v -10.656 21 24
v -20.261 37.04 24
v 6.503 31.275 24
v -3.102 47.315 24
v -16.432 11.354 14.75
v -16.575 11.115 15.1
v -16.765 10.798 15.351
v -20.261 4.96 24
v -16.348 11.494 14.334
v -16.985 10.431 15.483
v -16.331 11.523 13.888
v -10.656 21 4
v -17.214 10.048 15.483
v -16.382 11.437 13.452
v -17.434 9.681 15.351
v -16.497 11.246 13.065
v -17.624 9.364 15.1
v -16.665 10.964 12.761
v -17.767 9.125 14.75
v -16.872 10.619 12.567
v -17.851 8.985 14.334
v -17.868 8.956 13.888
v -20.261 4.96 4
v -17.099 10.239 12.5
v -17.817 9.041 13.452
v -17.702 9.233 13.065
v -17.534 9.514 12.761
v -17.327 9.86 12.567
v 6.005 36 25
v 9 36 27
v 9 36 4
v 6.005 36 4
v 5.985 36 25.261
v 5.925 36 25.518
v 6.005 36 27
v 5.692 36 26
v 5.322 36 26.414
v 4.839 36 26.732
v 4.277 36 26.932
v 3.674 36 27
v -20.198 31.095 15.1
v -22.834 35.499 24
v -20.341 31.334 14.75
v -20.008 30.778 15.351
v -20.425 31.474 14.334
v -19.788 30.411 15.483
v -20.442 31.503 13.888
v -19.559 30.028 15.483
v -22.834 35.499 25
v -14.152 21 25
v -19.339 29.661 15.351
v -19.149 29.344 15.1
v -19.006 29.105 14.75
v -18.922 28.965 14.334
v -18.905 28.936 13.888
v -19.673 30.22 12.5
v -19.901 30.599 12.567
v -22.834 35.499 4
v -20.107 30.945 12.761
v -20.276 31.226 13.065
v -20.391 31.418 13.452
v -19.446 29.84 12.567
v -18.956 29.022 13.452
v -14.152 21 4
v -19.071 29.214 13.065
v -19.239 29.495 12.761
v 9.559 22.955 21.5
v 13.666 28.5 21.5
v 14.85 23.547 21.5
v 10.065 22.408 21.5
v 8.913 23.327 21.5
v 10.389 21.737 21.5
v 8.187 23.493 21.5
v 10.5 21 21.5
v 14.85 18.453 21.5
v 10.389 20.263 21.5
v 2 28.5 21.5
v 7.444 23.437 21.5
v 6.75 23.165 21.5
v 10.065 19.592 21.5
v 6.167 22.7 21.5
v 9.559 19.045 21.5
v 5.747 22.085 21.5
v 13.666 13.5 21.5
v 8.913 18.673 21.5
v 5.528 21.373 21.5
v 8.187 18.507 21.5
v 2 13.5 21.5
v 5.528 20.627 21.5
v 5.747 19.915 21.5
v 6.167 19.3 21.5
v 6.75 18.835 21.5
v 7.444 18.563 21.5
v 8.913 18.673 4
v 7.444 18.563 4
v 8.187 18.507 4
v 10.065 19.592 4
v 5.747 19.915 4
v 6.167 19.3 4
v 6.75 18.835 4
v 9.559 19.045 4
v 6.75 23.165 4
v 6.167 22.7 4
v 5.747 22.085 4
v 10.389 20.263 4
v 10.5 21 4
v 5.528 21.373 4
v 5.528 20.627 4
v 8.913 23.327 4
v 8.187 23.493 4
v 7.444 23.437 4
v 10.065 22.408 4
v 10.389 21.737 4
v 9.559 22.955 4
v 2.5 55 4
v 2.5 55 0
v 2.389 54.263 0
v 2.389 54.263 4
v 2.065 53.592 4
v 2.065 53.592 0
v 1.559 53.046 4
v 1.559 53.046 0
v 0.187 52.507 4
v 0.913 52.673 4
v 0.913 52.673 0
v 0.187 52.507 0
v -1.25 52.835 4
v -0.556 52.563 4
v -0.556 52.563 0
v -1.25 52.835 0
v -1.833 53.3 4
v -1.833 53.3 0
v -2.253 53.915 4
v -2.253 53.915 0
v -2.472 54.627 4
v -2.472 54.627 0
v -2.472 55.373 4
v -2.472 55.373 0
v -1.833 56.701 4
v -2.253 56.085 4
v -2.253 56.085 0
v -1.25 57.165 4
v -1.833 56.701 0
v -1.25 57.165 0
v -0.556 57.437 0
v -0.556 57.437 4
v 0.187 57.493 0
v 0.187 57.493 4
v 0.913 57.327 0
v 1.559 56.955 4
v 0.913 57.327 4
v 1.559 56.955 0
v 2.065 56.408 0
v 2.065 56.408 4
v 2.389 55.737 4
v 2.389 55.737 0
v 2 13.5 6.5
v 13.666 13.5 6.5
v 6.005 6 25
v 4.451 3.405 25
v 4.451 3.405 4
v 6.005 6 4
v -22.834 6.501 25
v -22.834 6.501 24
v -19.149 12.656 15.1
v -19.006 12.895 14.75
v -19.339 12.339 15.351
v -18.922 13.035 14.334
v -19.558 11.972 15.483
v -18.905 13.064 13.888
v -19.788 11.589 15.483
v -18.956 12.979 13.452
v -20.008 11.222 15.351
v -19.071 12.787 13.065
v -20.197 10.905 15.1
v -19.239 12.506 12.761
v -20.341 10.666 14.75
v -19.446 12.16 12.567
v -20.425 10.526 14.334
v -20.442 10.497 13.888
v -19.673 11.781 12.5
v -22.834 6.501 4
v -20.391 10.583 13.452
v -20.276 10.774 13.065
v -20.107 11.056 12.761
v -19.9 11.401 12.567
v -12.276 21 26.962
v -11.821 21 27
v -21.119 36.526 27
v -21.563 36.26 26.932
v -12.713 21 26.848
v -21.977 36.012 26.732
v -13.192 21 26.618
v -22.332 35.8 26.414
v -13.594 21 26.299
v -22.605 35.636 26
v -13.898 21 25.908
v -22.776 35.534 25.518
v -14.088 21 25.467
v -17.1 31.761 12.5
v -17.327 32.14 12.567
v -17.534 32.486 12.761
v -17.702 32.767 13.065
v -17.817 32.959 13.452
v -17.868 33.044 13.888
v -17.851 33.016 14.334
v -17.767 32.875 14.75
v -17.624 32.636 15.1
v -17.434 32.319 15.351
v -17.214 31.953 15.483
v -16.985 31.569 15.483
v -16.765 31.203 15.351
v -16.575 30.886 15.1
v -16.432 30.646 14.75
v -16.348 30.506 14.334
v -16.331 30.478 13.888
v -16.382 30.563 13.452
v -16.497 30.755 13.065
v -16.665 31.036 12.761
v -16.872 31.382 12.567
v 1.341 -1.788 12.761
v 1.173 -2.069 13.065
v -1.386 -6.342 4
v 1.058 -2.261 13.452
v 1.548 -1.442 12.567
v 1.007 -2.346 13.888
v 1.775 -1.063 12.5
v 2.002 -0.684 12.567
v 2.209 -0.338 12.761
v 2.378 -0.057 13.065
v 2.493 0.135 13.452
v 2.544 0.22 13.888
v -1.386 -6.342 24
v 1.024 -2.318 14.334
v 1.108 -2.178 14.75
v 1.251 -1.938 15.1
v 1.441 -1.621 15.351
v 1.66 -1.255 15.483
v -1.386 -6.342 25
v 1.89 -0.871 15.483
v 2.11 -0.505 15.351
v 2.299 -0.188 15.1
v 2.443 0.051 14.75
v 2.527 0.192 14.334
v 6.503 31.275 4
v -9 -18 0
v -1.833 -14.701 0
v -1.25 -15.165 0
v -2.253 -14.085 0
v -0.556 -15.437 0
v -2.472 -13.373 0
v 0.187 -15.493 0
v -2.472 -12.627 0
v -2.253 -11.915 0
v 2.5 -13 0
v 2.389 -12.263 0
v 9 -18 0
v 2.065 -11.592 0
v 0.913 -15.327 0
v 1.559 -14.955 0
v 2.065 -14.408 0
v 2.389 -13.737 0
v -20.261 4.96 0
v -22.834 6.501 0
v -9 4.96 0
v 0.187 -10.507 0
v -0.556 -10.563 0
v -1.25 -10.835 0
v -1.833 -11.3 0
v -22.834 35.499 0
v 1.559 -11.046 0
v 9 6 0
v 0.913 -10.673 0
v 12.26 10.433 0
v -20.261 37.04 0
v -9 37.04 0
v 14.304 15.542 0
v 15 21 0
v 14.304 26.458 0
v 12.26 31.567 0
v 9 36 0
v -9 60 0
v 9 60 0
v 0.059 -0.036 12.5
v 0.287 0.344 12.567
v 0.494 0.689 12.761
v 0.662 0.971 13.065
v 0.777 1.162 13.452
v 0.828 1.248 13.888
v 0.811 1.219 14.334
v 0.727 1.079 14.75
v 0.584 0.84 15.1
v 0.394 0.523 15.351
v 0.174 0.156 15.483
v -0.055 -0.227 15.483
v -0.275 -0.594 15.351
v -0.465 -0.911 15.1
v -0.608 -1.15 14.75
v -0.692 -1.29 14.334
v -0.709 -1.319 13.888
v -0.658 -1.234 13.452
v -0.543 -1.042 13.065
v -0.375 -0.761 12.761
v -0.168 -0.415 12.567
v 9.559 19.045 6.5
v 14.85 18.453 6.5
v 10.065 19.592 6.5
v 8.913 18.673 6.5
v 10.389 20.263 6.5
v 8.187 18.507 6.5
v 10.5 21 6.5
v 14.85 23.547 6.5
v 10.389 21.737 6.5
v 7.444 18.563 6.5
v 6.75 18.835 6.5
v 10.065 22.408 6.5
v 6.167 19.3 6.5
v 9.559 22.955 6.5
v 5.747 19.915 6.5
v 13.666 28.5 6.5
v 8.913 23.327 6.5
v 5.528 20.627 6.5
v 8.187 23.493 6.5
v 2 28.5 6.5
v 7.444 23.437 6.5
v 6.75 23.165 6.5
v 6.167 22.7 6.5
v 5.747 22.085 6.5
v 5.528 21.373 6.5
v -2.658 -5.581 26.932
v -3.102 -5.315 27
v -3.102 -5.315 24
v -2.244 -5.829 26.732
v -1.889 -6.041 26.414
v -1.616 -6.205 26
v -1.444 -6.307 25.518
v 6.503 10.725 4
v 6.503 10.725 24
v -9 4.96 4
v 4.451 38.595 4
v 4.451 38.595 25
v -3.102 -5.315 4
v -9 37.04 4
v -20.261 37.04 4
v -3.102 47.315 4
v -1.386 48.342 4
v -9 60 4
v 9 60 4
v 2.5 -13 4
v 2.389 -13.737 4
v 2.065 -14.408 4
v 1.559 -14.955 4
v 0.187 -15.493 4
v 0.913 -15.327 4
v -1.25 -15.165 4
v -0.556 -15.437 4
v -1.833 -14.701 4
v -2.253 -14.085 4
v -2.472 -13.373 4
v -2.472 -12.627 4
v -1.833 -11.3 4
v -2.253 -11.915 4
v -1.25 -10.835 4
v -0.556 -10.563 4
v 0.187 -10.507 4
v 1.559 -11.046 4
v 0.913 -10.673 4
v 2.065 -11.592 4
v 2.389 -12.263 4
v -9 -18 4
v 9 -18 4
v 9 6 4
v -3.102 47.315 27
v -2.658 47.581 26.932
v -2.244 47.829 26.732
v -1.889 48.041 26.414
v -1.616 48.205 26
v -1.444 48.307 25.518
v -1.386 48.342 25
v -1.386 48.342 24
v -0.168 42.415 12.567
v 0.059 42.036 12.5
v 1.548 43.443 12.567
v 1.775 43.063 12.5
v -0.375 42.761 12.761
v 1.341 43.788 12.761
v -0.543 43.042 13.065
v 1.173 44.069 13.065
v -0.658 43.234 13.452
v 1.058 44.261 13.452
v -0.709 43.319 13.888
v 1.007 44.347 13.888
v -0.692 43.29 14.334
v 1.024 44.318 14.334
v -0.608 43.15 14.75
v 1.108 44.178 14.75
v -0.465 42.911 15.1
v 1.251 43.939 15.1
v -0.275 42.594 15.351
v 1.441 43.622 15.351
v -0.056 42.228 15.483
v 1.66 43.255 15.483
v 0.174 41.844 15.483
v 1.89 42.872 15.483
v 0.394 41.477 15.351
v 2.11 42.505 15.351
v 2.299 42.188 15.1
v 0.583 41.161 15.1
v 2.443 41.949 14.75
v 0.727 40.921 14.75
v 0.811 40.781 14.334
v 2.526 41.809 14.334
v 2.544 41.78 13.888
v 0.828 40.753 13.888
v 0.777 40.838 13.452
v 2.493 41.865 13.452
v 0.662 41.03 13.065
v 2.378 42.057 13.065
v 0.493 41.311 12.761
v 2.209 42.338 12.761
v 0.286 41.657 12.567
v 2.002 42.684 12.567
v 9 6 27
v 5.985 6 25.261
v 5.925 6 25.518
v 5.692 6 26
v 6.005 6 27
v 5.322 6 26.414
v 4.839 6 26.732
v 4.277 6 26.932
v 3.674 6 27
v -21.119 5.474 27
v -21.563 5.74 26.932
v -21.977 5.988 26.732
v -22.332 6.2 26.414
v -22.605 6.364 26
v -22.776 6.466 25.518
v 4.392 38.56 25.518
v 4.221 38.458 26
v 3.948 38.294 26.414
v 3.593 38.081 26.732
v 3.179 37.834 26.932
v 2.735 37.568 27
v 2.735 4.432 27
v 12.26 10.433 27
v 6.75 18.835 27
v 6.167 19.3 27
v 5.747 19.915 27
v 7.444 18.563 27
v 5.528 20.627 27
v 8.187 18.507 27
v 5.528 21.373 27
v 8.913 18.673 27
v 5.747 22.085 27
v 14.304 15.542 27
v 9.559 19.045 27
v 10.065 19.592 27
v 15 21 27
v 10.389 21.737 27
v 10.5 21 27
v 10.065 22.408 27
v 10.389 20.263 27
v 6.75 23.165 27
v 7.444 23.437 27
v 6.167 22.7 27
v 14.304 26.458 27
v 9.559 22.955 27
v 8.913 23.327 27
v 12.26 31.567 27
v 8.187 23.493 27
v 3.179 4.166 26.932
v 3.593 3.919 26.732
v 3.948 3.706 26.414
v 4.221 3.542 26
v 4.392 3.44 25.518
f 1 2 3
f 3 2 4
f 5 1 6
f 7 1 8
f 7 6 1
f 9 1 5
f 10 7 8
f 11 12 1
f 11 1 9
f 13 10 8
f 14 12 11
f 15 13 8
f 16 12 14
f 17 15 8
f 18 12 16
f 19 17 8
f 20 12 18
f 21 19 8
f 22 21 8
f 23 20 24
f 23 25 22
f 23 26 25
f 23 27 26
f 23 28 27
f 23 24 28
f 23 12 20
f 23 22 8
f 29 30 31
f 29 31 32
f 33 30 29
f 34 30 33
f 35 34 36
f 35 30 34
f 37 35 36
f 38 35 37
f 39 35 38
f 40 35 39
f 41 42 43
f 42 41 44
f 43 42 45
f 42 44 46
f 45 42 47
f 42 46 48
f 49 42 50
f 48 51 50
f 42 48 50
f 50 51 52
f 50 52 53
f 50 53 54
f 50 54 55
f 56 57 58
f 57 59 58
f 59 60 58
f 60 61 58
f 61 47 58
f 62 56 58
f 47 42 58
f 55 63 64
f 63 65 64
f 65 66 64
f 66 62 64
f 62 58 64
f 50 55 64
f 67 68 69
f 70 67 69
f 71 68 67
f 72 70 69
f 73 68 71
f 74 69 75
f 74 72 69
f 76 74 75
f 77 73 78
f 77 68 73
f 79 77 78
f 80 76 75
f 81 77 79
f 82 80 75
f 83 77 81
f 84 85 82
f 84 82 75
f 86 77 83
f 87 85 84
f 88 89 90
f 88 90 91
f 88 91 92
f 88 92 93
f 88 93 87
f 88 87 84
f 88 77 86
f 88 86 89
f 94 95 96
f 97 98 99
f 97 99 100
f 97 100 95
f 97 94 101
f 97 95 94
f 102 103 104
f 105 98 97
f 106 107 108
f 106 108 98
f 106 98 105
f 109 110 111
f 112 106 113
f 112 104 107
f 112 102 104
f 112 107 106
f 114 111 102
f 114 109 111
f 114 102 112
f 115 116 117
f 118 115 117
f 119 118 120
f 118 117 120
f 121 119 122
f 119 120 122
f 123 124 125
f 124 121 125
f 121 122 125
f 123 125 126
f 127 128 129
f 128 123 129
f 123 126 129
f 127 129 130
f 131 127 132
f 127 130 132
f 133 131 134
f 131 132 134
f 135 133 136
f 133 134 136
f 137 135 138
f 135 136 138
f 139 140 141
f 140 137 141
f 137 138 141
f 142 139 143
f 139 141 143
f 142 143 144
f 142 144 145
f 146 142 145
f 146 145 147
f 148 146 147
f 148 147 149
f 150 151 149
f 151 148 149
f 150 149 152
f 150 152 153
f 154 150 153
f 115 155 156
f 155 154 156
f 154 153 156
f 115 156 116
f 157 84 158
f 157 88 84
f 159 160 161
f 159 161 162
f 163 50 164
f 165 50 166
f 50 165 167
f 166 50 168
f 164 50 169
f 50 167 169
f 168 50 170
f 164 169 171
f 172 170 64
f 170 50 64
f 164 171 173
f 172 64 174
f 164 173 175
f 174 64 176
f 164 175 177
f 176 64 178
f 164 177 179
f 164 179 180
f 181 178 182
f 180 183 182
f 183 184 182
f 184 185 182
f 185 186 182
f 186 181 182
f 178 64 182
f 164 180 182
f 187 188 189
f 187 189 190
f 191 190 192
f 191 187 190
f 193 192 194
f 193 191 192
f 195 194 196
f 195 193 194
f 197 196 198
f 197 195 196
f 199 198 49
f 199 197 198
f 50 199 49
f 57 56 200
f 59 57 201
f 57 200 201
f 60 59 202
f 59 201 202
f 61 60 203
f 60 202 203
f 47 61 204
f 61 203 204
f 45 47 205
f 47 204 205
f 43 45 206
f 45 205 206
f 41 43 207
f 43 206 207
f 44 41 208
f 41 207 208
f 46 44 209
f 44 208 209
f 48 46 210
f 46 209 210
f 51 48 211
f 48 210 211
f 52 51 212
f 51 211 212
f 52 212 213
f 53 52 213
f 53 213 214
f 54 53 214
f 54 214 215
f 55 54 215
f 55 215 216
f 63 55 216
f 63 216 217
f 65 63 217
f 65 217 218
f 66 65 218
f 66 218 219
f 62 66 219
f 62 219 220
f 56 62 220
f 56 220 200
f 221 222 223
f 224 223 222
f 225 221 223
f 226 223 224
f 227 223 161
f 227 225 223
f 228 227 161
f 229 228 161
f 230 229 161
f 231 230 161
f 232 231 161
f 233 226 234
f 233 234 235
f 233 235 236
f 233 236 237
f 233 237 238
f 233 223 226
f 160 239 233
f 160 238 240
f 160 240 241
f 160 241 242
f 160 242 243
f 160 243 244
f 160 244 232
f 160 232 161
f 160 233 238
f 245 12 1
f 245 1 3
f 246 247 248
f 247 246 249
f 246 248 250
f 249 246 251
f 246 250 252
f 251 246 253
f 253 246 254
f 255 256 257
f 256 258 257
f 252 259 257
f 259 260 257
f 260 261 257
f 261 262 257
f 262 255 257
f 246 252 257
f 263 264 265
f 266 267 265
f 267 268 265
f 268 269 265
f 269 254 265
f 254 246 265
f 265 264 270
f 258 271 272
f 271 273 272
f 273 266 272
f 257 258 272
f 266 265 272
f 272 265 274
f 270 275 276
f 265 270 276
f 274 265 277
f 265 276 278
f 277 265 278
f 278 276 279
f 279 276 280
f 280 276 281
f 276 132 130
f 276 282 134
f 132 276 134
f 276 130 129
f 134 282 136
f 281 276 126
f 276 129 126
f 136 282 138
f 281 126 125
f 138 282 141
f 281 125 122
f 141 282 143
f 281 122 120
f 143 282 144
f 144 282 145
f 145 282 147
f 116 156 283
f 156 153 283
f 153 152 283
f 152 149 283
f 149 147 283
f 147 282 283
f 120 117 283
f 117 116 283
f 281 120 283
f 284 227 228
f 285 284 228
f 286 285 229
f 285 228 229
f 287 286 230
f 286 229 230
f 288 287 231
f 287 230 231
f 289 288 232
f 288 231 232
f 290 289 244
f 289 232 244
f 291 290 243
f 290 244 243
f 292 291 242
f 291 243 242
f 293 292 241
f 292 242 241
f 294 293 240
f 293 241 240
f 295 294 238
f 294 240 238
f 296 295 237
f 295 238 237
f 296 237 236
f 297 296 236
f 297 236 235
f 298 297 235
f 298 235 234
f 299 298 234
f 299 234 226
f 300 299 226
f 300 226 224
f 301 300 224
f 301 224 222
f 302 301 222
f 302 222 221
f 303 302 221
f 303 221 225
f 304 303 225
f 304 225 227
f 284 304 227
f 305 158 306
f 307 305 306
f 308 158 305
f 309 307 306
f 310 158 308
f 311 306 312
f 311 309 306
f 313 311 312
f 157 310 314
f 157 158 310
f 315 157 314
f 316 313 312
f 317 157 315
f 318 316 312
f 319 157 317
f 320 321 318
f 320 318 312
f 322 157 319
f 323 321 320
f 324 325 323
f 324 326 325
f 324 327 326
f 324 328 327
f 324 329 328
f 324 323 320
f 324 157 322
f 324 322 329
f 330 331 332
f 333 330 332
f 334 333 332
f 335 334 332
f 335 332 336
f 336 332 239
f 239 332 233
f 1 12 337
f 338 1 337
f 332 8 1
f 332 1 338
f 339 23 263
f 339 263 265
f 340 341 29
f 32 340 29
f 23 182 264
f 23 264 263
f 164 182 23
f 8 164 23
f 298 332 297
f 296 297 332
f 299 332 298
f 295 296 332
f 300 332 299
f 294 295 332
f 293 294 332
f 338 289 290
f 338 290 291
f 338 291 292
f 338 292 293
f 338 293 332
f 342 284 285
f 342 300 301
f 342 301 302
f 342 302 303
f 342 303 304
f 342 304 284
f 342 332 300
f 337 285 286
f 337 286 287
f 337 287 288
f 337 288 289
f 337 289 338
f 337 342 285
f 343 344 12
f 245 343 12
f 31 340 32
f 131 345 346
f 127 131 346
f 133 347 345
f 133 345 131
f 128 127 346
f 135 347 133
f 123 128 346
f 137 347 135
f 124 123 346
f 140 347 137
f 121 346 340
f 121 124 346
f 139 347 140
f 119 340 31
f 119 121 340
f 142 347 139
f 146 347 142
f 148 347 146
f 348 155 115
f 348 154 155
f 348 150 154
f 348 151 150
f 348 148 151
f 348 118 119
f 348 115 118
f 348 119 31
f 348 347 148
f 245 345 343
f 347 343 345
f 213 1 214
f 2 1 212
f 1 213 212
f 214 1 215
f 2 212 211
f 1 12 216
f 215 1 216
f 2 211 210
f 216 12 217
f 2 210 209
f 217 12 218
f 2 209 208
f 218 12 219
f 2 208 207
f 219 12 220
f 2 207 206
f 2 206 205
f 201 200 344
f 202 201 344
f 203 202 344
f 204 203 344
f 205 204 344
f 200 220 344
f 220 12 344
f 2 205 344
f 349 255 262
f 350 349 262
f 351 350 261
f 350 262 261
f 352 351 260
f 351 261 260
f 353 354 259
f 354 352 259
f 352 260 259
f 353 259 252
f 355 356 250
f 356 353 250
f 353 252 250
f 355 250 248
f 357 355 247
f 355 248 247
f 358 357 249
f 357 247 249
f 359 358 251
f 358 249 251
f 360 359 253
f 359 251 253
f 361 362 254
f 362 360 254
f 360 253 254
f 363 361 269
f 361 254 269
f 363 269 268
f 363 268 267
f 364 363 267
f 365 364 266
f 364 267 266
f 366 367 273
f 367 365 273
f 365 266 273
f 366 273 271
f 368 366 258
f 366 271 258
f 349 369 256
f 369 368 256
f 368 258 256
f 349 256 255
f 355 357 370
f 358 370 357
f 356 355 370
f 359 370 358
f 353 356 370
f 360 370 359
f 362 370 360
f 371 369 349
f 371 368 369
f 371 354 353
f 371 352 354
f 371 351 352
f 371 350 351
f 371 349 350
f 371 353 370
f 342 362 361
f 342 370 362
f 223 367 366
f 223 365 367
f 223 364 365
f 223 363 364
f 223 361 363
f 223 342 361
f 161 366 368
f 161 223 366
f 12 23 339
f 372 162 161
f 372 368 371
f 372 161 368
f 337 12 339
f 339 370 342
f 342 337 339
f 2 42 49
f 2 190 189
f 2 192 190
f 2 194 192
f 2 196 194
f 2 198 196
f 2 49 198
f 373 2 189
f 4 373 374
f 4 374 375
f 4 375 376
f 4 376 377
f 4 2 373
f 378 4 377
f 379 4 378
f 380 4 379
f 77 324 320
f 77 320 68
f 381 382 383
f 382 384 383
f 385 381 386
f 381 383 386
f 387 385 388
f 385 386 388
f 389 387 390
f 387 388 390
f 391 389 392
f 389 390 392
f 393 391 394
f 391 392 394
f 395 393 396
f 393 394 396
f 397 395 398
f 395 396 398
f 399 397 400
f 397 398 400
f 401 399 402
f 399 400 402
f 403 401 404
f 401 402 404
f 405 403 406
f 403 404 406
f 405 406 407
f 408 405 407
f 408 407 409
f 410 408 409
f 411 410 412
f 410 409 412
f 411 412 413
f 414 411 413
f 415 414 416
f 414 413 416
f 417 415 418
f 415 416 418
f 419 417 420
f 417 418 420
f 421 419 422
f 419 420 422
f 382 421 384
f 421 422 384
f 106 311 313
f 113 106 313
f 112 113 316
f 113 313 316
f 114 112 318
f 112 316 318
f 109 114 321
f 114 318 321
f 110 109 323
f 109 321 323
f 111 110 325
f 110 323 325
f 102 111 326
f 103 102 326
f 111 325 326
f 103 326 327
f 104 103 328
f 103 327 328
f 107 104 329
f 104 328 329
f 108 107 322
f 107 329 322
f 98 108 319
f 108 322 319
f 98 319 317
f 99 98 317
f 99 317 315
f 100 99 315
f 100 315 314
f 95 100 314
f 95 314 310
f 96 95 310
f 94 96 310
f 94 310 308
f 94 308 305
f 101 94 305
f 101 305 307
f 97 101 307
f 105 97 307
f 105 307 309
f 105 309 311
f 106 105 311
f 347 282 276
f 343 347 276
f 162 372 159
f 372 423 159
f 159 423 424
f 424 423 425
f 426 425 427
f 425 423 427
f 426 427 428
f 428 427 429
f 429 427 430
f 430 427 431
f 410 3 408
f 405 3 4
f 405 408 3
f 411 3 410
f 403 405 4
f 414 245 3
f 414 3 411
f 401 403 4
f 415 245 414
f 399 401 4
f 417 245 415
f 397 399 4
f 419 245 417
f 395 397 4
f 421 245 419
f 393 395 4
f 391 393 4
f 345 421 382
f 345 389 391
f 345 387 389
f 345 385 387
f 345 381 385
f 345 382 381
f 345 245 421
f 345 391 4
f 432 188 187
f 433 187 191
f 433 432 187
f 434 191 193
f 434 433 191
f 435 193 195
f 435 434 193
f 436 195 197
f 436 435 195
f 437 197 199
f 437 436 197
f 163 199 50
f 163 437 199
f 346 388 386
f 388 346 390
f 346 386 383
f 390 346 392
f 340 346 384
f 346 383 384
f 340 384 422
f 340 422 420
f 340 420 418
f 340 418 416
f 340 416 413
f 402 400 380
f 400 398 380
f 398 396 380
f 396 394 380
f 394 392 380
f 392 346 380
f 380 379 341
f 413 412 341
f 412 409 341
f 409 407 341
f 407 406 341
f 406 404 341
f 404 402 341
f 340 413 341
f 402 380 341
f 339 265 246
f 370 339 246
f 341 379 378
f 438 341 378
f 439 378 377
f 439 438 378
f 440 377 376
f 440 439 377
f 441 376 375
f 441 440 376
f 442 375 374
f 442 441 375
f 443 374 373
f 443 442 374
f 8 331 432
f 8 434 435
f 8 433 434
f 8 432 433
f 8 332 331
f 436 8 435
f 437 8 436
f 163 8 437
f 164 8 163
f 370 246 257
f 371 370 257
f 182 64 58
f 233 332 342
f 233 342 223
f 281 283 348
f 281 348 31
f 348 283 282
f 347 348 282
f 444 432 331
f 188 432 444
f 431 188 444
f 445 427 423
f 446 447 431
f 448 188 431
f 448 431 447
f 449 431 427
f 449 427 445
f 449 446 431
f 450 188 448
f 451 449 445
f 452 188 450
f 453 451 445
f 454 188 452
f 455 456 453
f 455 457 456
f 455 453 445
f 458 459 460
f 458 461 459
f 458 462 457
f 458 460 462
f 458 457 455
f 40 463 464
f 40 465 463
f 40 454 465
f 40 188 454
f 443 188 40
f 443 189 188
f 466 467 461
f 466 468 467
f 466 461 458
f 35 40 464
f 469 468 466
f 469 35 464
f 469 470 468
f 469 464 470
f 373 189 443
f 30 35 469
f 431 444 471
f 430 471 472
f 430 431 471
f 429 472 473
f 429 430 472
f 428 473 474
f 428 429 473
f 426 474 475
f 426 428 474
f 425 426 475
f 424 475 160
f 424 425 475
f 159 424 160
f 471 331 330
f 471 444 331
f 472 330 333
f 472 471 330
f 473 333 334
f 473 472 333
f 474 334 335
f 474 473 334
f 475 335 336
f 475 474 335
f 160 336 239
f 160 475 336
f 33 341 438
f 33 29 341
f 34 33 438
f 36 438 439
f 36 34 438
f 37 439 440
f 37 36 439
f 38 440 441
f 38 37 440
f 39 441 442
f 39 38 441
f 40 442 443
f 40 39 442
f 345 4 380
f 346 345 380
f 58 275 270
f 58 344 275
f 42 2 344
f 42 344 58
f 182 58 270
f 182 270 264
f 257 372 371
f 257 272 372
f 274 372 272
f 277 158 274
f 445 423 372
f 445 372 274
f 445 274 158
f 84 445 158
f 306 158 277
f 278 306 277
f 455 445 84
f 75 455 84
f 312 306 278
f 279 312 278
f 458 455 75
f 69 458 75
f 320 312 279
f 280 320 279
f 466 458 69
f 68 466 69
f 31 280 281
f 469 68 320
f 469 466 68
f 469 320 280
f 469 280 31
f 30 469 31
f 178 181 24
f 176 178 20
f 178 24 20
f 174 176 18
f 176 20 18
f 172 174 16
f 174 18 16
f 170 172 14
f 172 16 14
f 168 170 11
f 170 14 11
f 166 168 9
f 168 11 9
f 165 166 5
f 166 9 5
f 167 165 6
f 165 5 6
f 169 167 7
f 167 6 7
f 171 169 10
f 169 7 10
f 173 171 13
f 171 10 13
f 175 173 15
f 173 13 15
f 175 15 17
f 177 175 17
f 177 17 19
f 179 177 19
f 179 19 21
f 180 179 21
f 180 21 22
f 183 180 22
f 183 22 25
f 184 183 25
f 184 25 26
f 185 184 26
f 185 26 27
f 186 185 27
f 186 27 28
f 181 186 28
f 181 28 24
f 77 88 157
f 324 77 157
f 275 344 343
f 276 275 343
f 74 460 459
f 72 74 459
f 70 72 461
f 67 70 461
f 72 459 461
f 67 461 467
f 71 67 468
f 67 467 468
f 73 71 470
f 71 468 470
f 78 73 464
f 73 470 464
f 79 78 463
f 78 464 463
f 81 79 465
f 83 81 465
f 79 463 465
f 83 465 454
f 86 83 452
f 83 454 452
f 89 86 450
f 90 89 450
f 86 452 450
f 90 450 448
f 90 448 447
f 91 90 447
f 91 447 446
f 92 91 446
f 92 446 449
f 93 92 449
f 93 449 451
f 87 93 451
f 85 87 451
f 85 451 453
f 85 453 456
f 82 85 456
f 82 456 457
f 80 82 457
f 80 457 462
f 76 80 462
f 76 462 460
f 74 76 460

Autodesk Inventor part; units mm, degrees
ref_plane "YZ Plane" through (0, 0, 0) normal (1, 0, 0) x (0, 1, 0)
sketch "Sketch1" plane through (0, 0, 0) normal (0, 0, 1) x (1, 0, 0)
  circle A0 centre (-0.0001, 55.0001) radius 2.5 projected
  line L0 (-9, 60.0001) -> (-9, 34.0001) projected
  line L1 (-9, 34.0001) -> (-5.0001, 34.0001) projected
  line L2 (-5.0001, 34.0001) -> (-5.0001, 45.0001) projected
  line L3 (-5.0001, 45.0001) -> (4.9999, 45.0001) projected
  line L4 (4.9999, 45.0001) -> (4.9999, 34.0001) projected
  line L5 (4.9999, 34.0001) -> (8.9999, 34.0001) projected
  line L6 (8.9999, 34.0001) -> (8.9999, 60.0001) projected
  line L7 (8.9999, 60.0001) -> (-9, 60.0001) projected
  line L8 (-9, 8) -> (-9, -18) projected
  line L9 (-5, -18) -> (-5, -8) projected
  circle A1 centre (-0.0001, -13.0001) radius 2.5 projected
  line L10 (8.9999, -18.0001) -> (8.9999, 7.9999) projected
  line L11 (8.9999, 7.9999) -> (4.9999, 7.9999) projected
  line L12 (4.9999, 7.9999) -> (4.9999, 2.5001) projected
  line L13 (5, -3) -> (-5.0001, -3.0001) projected
  line L14 (-5.0001, -3.0001) -> (-5.0001, 7.9999) projected
  line L15 (-5.0001, 7.9999) -> (-9, 7.9999) projected
  line L16 (-9, -18.0001) -> (8.9999, -18.0001) projected
  line L17 (8.9999, 60.0001) -> (-9, 60.0001)
  line L18 (-9, 60.0001) -> (-9, -18)
  line L19 (-9, -18) -> (8.9999, -18)
  line L20 (8.9999, -18) -> (8.9999, 60.0001)
  circle A2 centre (-0.0001, 55.0001) radius 2.5
  circle A3 centre (-0.0001, -13.0001) radius 2.5
  line L21 (-9, 7.9999) -> (-9, -18.0001) projected
  line L22 (4.9999, 2.5001) -> (5, -3) projected
  point P0 (0, 0)
  dimension "d0" = 4
  dimension "d1" = 0
extrude "Extrusion1" add sketch "Sketch1" along normal blind 4
sketch "Sketch2" plane through (0, 0, 4) normal (0, 0, 1) x (1, 0, 0)
  circle A0 centre (-55.3, -73.0192) radius 2.5 projected
  circle A1 centre (-55.3001, 115.0193) radius 2.5 projected
  line L0 (-55.3, -73.0192) -> (33.584, 75.4143)
  line L1 (-55.3001, 115.0193) -> (26.1085, -20.9304)
  line L2 (-9, 60) -> (-9, -18) projected
  line L3 (-9, 21) -> (62.9573, 21)
  line L4 (1, 21) -> (-7.5794, 15.8625)
  line L5 (-55.3001, 115.0193) -> (-50.1626, 106.4399)
  line L6 (-50.1626, 106.4399) -> (-41.5832, 111.5774)
  line L7 (-50.1626, 106.4399) -> (-58.742, 101.3024)
  line L8 (-7.5794, 15.8625) -> (-58.742, 101.3024)
  line L9 (1, 21) -> (9.5794, 26.1375)
  line L10 (9.5794, 26.1375) -> (-41.5832, 111.5774)
  line L11 (1, 21) -> (-7.5794, 26.1375)
  line L12 (1, 21) -> (9.5794, 15.8625)
  line L13 (-55.3, -73.0192) -> (-50.1625, -64.4398)
  line L14 (-93.1275, -68.5) -> (-47.8, -94.6699) projected
  line L15 (-50.1625, -64.4398) -> (-41.5831, -69.5773)
  line L16 (-50.1625, -64.4398) -> (-58.742, -59.3023)
  line L17 (-41.5831, -69.5773) -> (9.5794, 15.8625)
  line L18 (-7.5794, 26.1375) -> (-58.742, -59.3023)
  line L19 (-10.6558, 21) -> (6.503, 31.2749)
  line L20 (-10.6558, 21) -> (6.503, 10.7251)
  circle A2 centre (-0.0001, -13.0001) radius 2.5 projected
  circle A3 centre (-0.0001, -13.0001) radius 5
  circle A4 centre (-0.0001, 55.0001) radius 2.5 projected
  circle A5 centre (-0.0001, 55.0001) radius 5
  line L21 (8.9999, 60.0001) -> (-9, 60.0001) projected
  line L22 (-9, -18.0001) -> (8.9999, -18.0001) projected
  line L23 (-20.2607, 4.9602) -> (12.7451, -14.8042)
  line L24 (-20.2607, 37.0398) -> (12.7451, 56.8042)
  line L25 (-20.2607, 4.9602) -> (-22.8345, 6.5014)
  line L26 (-9, 21) -> (-33.1607, 21)
  line L27 (-22.8345, 6.5014) -> (-14.1525, 21)
  line L28 (-20.2607, 37.0398) -> (-22.8345, 35.4986)
  line L29 (-22.8345, 35.4986) -> (-14.1525, 21)
  line L30 (6.503, 10.7251) -> (8.9999, 9.2299)
  line L31 (8.9999, -18.0001) -> (8.9999, 60.0001) projected
  line L32 (6.503, 31.2749) -> (8.9999, 32.7701)
  line L33 (8.9999, 32.7701) -> (-0.605, 48.8099)
  line L34 (8.9999, 9.2299) -> (-0.605, -6.8099)
  line L35 (8.9999, 32.7701) -> (8.9999, 9.2299)
  line L36 (-22.8345, 6.5014) -> (-22.8345, 35.4986)
  point P0 (0, 0)
  point P1 (-20.2607, 37.0398)
  point P2 (6.503, 10.7251)
  point P3 (-3.1018, -5.3148)
  point P4 (8.524, 8.4352)
  point P5 (7.516, 10.1185)
  point P6 (-3.1019, 47.3148)
  point P7 (6.503, 31.2749)
  point P8 (-2.0764, 26.1375)
  point P9 (-11.6813, 42.1773)
  point P10 (6.8279, 11.2676)
  point P11 (8.9999, 14.8947)
  point P12 (8.9999, 16.2096)
  point P13 (6.503, 10.7251)
  point P14 (8.9999, 25.7904)
  point P15 (6.503, 31.2749)
  point P16 (8.9999, 27.1053)
  point P17 (8.9999, 32.7701)
  point P18 (8.9999, 32.7704)
  point P19 (8.9999, 9.2299)
  point P20 (8.9999, 7.6404)
  point P21 (8.9999, 9.2296)
  point P22 (8.9999, 54.5615)
  point P23 (8.9999, -12.5615)
  dimension "d0" = 4
  dimension "d1" = 0
  dimension "d2" = 10
  dimension "d3" = 10
  dimension "d4" = 10
  dimension "d5" = 10
  dimension "d6" = 10
  dimension "d7" = 10
  dimension "d8" = 10
  dimension "d9" = 10
  dimension "d10" = 10
  dimension "d11" = 10
  dimension "d12" = 10
  dimension "d13" = 20
  dimension "d14" = 20
  dimension "d15" = 3
  dimension "d16" = 3
extrude "Extrusion2" add sketch "Sketch2" along normal blind 20 contours L25 L27 L26 L18 | L20 L4 L0 | L0 L1 L17 L20 | L26 L29 L28 L8 | L26 L2 L20 | L19 L2 L26 | L17 L30 L1 L34 L23 | L1 L19 L10 L0 | L11 L19 L1 | L12 L31 L17 L1 | L4 L20 L2 L3 | L9 L31 L3 | L0 L10 L31 L9 | L3 L2 L19 L11 | L3 L31 L12 | L17 L1 L30 | L34 L1 L31 L23 | L10 L32 L0 | L0 L32 L31 L10 | L17 L31 L30 L1 | L30 L34 L1 | L34 L31 L1 | L32 L10 L24 L33 L0 | L0 L33 L32 | L33 L24 L31 L0 | L0 L31 L33
sketch "Sketch3" plane through (0, 0, 4) normal (0, 0, -1) x (-1, 0, 0)
  line L0 (10.6558, 21) -> (20.2607, 37.0398) projected
  line L1 (20.2607, 37.0398) -> (8.9915, 37.0398)
  line L2 (20.2607, 4.9602) -> (10.6558, 21) projected
  line L3 (20.2607, 4.9602) -> (9, 4.9602)
  line L4 (9, 20.0085) -> (9, -18) projected
  line L5 (22.8345, 35.4986) -> (14.1525, 21) projected
  line L6 (22.8345, 6.5014) -> (20.2607, 4.9602) projected
  line L7 (22.8345, 35.4986) -> (22.8345, 6.5014)
  line L8 (9, 60) -> (9, -18) projected
  line L9 (10.6558, 21) -> (9, 20.0085) projected
  line L10 (9, 21.9915) -> (10.6558, 21) projected
  line L11 (22.8345, 6.5014) -> (20.2607, 4.9602) projected
  line L12 (14.1525, 21) -> (22.8345, 6.5014) projected
  line L13 (22.8345, 35.4986) -> (14.1525, 21) projected
  line L14 (20.2607, 37.0398) -> (22.8345, 35.4986) projected
  line L15 (10.6558, 21) -> (20.2607, 37.0398) projected
  line L16 (20.2607, 4.9602) -> (10.6558, 21) projected
  line L17 (-8.9999, 60.0001) -> (9, 60.0001) projected
  line L18 (-8.9999, -18.0001) -> (-8.9999, 60.0001) projected
  line L19 (9, -18.0001) -> (-8.9999, -18.0001) projected
  circle A0 centre (0.0001, -13.0001) radius 2.5 projected
  circle A1 centre (0.0001, 55.0001) radius 2.5 projected
  line L20 (9, 60.0001) -> (9, -18.0001) projected
  point P0 (0, 0)
  point P1 (9, 37.0398)
  dimension "d0" = 4
  dimension "d1" = 0
ref_plane "Work Plane1" through (-20.2583, -25.7942, 0) normal (0, 0, 1) x (1, 0, 0)
extrude "Extrusion3" add sketch "Sketch3" along normal up to surface (4 mm away) contours L10 L8 L1 L0 | L0 L14 L5 L12 L6 L2 | L2 L3 L4 L9 | L9 L8 L10 | L7 L12 L5
ref_plane "Work Plane4" through (8.9999, -18.0001, 0) normal (1, 0, 0) x (0, 0, -1)
sketch "Sketch12" plane through (0, 0, 24) normal (0, 0, 1) x (1, 0, 0)
  line L0 (-3.1018, -5.3148) -> (8.9999, -12.5615) projected
  line L1 (-14.1525, 21) -> (-22.8345, 6.5014) projected
  line L2 (8.9999, -12.5615) -> (-22.8345, 6.5014)
  line L3 (-22.8345, 6.5014) -> (-14.1525, 21)
  line L4 (-22.8345, 35.4986) -> (-14.1525, 21) projected
  line L5 (-14.1525, 21) -> (-22.8345, 35.4986)
  line L6 (-22.8345, 35.4986) -> (8.9999, 54.5615)
  line L7 (8.9999, 54.5615) -> (8.9999, -12.5615)
  point P0 (0, 0)
extrude "Extrusion12" add sketch "Sketch12" along normal blind 3
sketch "Sketch13" plane through (0, 0, 27) normal (0, 0, 1) x (1, 0, 0)
  line L0 (8.9999, -12.5615) -> (8.9999, 54.5615) projected
  line L1 (8.9999, 21) -> (14.9999, 21)
  line L2 (8.9999, 21) -> (8.9999, 6)
  line L3 (8.9999, 21) -> (8.9999, 36)
  arc A0 (8.9999, 6) -> (8.9999, 36) centre (-6.7501, 21) ccw
  point P0 (0, 0)
  dimension "d52" = 6
  dimension "d53" = 15
  dimension "d54" = 15
extrude "Extrusion13" add sketch "Sketch13" against normal up to surface (27 mm away)
sketch "Sketch14" plane through (0, 0, 27) normal (0, 0, 1) x (1, 0, 0)
  arc A0 (8.9999, 6) -> (8.9999, 36) centre (-6.7501, 21) ccw projected
  line L0 (14.9999, 21) -> (7.9999, 21)
  circle A1 centre (7.9999, 21) radius 2.5
  point P0 (0, 0)
  dimension "d57" = 7
  dimension "d58" = 5
extrude "Extrusion14" cut sketch "Sketch14" against normal up to surface (23 mm away)
sketch "Sketch15" plane through (8.9999, -18.0001, 4) normal (1, 0, 0) x (0, 0, -1)
  line L0 (-23, 54.0001) -> (-23, 24.0001) projected
  line L1 (-23, 39.0001) -> (-10, 39.0001)
  line L2 (0, 39.0001) -> (-20, 39.0001) projected
  line L3 (-17.5, 31.5001) -> (-2.5, 31.5001)
  line L4 (-2.5, 31.5001) -> (-2.5, 46.5001)
  line L5 (-2.5, 46.5001) -> (-17.5, 46.5001)
  line L6 (-17.5, 46.5001) -> (-17.5, 31.5001)
  line L7 (-17.5, 31.5001) -> (-2.5, 46.5001) construction
  line L8 (-2.5, 31.5001) -> (-17.5, 46.5001) construction
  point P0 (4, 18.0001)
  dimension "d61" = 15
  dimension "d62" = 15
extrude "Extrusion15" cut sketch "Sketch15" along normal blind 10 and the other way blind 7
sketch "Sketch16" plane through (0, 0, 27) normal (0, 0, 1) x (1, 0, 0)
  line L0 (-3.1018, -5.3148) -> (6.503, 10.7251) projected
  line L1 (6.503, 31.2749) -> (-3.1019, 47.3148) projected
  line L2 (-3.1018, -5.3148) -> (-1.386, -6.3423)
  line L3 (-22.8345, 6.5014) -> (8.9999, -12.5615) projected
  line L4 (-1.386, -6.3423) -> (4.4507, 3.4048)
  line L5 (8.9999, -12.5615) -> (8.9999, 6) projected
  line L6 (8.9999, 6) -> (-9.8503, 6)
  line L7 (4.4507, 3.4048) -> (6.0048, 6)
  line L8 (-22.8345, 35.4986) -> (-14.1525, 21) projected
  line L9 (-14.1525, 21) -> (17.1457, 21)
  line L10 (-22.8345, 35.4986) -> (8.9999, 54.5615)
  line L11 (-1.386, 48.3423) -> (4.4507, 38.5952)
  line L12 (8.9999, 54.5615) -> (8.9999, 36)
  line L13 (8.9999, 36) -> (-9.8503, 36)
  line L14 (4.4507, 38.5952) -> (6.0048, 36)
  point P0 (0, 0)
  dimension "d67" = 2
extrude "Extrusion16" cut sketch "Sketch16" against normal up to surface (23 mm away) contours L4 L7 L6 L5 L3 | L14 L11 L10 L12 L13
sketch "Sketch17" plane through (6.0048, 6, 27) normal (0.8579416, -0.5137472, 0) x (0, 0, -1)
  line L0 (0, 2.5134) -> (0, -14.3859) projected
  line L1 (0, -8.2326) -> (13, -8.2326)
  circle A0 centre (13, -8.2326) radius 1.5
  point P0 (27, -8.2326)
  dimension "d71" = 13
  dimension "d72" = 3
extrude "Extrusion17" cut sketch "Sketch17" against normal through all
sketch "Sketch18" plane through (6.0048, 36, 27) normal (0.8579416, 0.5137472, 0) x (0, 0, -1)
  line L0 (23, 14.3859) -> (0, 14.3859) projected
  line L1 (0, 14.3859) -> (0, 8.2329)
  line L2 (0, 14.3859) -> (0, -2.5134) projected
  line L3 (0, 8.2329) -> (13, 8.2329)
  circle A0 centre (13, 8.2329) radius 1.5
  point P0 (27, -27.801)
  dimension "d75" = 6.153
  dimension "d76" = 13
  dimension "d77" = 3
extrude "Extrusion18" cut sketch "Sketch18" against normal through all
fillet "Fillet1" radius 2 4 edges at (2.3094, 42.1711, 27) (2.3094, -0.1711, 27) (-18.4935, 13.7507, 27) (-18.4935, 28.2493, 27)
properties part number "2020_top_guide_mnt" material "PET Plastic"
